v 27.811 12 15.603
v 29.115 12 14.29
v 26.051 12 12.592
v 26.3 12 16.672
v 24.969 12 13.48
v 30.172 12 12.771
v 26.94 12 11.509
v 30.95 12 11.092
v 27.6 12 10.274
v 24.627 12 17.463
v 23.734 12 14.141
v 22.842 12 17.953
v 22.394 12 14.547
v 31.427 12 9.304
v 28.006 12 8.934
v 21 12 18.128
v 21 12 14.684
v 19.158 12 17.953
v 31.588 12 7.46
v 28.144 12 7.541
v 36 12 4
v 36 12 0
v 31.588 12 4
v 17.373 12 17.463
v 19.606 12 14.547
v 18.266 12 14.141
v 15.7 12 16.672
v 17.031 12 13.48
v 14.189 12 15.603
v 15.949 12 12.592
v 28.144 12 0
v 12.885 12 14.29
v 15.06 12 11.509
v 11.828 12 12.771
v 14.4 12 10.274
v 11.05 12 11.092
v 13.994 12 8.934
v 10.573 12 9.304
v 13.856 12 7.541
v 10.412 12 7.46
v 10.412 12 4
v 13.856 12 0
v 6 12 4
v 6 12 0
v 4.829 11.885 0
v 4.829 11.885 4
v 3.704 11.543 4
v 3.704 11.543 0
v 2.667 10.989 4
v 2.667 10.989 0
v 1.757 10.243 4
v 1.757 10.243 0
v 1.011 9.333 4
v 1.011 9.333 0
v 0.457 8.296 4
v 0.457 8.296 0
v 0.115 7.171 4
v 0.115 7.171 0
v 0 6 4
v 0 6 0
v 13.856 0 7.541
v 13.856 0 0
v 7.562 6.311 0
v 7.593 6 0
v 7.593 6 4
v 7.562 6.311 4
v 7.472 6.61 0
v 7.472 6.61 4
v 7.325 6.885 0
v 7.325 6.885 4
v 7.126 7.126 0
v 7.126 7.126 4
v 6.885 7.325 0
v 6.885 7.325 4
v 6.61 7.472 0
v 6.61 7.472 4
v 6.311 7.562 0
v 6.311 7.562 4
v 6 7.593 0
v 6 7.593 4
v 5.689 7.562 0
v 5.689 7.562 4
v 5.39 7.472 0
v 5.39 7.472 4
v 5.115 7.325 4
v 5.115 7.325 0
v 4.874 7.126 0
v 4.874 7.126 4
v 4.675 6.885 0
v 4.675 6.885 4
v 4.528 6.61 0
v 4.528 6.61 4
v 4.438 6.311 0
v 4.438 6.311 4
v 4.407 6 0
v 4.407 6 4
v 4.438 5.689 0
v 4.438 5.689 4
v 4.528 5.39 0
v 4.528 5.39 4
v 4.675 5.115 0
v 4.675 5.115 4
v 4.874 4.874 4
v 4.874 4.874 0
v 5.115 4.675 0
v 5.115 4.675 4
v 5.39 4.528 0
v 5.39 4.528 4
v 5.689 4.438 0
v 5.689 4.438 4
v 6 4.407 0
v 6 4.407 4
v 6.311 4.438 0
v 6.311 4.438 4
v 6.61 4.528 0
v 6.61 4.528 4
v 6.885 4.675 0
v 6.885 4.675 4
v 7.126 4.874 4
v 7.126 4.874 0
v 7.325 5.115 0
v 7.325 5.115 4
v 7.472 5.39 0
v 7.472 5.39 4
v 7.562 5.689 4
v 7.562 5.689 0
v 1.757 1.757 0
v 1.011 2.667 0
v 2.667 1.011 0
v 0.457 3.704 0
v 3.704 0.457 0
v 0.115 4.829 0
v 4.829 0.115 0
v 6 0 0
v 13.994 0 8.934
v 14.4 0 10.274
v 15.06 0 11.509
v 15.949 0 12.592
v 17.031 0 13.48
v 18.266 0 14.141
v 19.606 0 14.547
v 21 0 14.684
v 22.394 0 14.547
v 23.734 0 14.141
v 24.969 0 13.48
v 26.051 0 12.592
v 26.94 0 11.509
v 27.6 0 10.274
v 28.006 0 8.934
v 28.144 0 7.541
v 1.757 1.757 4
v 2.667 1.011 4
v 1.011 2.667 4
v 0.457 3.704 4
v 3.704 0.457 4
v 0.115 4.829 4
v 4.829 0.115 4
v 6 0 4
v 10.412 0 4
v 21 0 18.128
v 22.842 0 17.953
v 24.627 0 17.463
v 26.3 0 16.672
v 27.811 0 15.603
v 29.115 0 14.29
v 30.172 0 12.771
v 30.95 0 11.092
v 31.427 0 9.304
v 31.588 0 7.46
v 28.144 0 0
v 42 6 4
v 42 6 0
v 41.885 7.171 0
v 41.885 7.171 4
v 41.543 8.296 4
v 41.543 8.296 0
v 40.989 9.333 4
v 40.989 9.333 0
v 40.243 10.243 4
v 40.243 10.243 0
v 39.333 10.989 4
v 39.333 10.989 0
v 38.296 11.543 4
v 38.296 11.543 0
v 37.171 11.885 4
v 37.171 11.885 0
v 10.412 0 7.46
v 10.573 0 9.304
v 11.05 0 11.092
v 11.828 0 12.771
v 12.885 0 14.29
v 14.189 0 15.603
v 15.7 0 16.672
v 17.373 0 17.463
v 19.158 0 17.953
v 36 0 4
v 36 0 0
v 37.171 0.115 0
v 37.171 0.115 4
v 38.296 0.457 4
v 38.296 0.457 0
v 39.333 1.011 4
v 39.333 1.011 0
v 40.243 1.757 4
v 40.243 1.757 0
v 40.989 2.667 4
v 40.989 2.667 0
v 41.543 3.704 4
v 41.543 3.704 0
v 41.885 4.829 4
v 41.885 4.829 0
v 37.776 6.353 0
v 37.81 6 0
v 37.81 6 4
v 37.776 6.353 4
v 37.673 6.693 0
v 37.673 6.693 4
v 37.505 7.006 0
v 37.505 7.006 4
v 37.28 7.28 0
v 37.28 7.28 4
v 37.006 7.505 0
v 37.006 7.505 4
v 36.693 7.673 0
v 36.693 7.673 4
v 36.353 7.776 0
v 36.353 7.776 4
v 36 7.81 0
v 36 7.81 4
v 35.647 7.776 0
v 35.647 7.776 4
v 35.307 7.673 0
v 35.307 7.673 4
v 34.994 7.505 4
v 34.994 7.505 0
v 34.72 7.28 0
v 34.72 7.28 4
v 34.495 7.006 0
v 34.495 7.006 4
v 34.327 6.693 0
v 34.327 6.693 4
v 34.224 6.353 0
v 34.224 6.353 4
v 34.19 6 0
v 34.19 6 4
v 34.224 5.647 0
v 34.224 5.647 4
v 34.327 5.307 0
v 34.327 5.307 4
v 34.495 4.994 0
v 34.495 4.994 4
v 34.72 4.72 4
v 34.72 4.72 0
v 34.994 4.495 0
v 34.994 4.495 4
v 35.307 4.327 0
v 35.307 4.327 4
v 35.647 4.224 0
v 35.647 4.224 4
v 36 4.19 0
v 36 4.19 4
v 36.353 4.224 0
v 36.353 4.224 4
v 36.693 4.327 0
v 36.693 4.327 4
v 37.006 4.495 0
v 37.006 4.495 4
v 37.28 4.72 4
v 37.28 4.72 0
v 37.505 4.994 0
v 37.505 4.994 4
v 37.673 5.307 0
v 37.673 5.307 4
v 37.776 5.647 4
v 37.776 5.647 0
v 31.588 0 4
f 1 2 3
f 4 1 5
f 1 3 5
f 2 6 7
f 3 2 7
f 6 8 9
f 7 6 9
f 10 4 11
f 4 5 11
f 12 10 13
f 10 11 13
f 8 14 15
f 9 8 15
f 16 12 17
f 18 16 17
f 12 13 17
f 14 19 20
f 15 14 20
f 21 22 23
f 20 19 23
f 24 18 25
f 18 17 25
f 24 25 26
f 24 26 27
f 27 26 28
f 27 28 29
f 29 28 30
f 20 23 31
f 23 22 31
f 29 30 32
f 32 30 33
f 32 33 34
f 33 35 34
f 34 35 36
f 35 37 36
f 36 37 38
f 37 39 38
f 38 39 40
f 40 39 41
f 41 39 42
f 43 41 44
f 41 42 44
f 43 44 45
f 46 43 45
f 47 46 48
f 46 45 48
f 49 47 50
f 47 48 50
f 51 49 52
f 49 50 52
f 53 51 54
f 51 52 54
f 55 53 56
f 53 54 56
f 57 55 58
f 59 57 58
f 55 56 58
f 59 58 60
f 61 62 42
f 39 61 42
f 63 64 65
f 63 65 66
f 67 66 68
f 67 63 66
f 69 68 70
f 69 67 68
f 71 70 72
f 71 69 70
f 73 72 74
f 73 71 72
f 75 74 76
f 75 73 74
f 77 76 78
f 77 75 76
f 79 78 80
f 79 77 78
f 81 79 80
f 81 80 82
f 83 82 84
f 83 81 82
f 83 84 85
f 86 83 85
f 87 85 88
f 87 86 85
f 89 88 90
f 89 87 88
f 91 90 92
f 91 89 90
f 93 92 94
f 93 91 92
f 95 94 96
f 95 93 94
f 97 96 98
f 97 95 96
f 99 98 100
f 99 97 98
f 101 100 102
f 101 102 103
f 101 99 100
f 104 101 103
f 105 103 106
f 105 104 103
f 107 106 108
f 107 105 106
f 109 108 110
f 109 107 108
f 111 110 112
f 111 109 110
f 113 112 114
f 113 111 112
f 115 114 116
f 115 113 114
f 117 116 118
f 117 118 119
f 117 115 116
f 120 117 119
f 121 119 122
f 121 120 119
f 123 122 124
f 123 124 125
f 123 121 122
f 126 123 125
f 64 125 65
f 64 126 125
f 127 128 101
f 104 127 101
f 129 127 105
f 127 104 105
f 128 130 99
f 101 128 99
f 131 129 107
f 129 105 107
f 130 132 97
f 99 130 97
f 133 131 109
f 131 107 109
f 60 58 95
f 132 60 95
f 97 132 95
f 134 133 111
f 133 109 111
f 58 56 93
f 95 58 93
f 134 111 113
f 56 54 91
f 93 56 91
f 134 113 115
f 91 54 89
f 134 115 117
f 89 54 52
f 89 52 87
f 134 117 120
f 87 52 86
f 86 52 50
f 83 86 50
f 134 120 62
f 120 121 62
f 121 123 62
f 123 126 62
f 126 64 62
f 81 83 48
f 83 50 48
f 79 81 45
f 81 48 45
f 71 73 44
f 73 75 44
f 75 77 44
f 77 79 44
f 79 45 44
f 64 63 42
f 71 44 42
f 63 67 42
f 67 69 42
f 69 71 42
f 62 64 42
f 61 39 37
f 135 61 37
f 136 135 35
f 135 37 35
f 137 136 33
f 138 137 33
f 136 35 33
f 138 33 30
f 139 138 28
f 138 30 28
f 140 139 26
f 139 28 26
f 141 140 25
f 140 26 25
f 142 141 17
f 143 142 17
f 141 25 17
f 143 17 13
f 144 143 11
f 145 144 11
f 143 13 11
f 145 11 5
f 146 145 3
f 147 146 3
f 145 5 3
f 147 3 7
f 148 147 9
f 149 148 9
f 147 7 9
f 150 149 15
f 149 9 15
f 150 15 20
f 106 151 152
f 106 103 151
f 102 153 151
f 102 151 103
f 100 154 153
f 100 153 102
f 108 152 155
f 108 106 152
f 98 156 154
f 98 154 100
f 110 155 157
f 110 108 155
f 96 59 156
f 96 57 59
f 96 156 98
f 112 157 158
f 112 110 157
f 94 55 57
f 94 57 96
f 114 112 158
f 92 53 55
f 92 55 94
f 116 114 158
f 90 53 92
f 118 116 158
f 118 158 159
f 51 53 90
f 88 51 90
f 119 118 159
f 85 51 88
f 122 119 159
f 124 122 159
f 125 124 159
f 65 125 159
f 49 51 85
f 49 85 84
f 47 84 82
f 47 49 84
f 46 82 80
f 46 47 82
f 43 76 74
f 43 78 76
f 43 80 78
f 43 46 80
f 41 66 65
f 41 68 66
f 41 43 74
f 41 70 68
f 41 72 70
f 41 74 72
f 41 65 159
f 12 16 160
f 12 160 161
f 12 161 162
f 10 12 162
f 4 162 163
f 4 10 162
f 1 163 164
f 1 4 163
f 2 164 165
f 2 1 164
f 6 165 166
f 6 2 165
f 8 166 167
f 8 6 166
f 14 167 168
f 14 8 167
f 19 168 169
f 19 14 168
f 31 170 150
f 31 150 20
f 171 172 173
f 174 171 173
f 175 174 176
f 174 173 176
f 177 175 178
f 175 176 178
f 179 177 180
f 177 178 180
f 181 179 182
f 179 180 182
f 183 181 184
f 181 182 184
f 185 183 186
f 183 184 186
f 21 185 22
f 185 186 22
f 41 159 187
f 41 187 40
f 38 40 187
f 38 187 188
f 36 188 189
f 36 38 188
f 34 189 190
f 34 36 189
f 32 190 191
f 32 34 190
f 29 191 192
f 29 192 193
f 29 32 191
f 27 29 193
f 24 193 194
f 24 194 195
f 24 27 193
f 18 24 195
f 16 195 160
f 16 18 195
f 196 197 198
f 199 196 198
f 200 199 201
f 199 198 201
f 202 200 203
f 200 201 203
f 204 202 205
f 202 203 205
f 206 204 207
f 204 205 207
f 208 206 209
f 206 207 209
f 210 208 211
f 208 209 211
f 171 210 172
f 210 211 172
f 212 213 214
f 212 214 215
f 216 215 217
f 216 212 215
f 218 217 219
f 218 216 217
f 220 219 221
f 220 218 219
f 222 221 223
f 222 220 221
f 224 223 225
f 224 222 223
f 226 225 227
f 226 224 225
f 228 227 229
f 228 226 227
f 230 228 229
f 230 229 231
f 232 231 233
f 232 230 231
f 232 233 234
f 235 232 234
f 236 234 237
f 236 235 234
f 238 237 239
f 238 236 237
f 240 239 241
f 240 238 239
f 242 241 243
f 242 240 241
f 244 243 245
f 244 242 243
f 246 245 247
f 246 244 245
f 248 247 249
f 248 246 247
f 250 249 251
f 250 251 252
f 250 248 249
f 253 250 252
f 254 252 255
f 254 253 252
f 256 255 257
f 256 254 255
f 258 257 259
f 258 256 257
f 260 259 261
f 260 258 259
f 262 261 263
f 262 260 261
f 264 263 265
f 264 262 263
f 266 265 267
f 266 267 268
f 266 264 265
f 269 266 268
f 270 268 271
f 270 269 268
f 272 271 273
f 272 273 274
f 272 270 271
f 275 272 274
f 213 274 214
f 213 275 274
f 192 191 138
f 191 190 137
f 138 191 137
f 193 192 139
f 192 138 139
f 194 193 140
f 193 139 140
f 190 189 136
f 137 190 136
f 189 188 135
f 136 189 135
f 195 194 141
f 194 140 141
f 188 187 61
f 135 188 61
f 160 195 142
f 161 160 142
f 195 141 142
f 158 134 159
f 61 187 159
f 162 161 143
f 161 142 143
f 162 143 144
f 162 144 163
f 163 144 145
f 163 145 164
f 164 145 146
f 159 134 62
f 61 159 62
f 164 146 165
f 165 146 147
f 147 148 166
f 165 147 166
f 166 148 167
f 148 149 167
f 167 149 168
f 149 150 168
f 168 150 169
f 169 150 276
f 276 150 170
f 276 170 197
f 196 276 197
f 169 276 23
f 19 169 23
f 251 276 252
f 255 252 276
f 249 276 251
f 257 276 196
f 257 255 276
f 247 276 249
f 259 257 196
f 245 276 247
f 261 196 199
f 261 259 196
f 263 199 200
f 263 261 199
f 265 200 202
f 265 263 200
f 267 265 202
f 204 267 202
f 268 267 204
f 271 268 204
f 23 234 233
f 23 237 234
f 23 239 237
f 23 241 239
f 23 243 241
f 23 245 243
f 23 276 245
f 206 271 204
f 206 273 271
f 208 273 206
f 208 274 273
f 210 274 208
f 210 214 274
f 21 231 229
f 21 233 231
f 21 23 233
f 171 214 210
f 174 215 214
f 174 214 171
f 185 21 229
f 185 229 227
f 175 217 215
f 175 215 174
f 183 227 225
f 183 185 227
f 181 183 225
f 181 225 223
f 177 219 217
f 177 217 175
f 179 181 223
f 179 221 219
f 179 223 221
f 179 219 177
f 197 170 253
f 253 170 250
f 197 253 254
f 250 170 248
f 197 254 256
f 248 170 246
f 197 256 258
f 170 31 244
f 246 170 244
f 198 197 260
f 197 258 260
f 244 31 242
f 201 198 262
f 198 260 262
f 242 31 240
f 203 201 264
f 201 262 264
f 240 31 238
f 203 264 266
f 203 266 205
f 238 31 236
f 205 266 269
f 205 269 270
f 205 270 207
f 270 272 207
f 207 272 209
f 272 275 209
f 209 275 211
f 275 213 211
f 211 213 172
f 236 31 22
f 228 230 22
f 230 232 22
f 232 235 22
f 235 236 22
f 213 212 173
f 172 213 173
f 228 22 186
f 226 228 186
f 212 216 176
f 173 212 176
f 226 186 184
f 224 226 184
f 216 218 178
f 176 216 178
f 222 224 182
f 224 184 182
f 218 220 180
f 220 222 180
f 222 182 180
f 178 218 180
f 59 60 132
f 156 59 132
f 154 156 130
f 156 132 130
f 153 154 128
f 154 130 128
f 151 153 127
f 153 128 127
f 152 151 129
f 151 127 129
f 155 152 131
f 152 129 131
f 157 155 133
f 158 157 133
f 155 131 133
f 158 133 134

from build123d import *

# Parameters (mm, degrees)
F0_R        = 1.5930303601
F1_DEPTH    = 4
F0_R_2      = 1.8103813353
F0_W        = 18
F0_H        = 12
F0_W_2      = 1.5875
F2_DEPTH    = 18.1281324
F3_R        = 7.14375
F4_DEPTH    = 25.4
F5_W        = 14.2875
F5_H        = 12.0000014
F6_DEPTH    = 7.540625
F7_T1_DEPTH = 65.34


# Not quite as in the source:
# - a fillet or chamfer that OpenCascade refuses, or shapes differently, is made with other operations: its cross-section is extruded or revolved along the edge and cut away or added


with BuildPart() as f1:
    # F0 (on Top) → F1 (new body)
    with BuildSketch(Plane.XY):
        with BuildLine():
            ThreePointArc((0, 6), (1.7573593129, 1.7573593129), (6, 0))
            Line((6, 0), (10.4125, 0))
            Line((10.4125, 0), (10.4125, 12))
            Line((10.4125, 12), (6, 12))
            ThreePointArc((6, 12), (1.7573593129, 10.2426406871), (0, 6))
        make_face()
        with Locations((6, 6)):
            Circle(F0_R, mode=Mode.SUBTRACT)
    extrude(amount=F1_DEPTH)



with BuildPart() as f1b:
    # F0 (on Top) → F1, piece 2 (new body)
    with BuildSketch(Plane.XY):
        with BuildLine():
            Line((31.5875, 12), (31.5875, 0))
            Line((31.5875, 0), (36, 0))
            ThreePointArc((36, 0), (40.2426406871, 1.7573593129), (42, 6))
            ThreePointArc((42, 6), (40.2426406871, 10.2426406871), (36, 12))
            Line((36, 12), (31.5875, 12))
        make_face()
        with Locations((36, 6)):
            Circle(F0_R_2, mode=Mode.SUBTRACT)
    extrude(amount=F1_DEPTH)


with BuildPart() as f1_1:
    add(f1.part)

    add(f1b.part)  # F2 merges F1b
    # F0 (on Top) → F2 (join)
    with BuildSketch(Plane.XY):
        with Locations((21, 6)):
            Rectangle(F0_W, F0_H)
        with Locations((11.20625, 6)):
            Rectangle(F0_W_2, F0_H)
        with Locations((30.79375, 6)):
            Rectangle(F0_W_2, F0_H)
    extrude(amount=F2_DEPTH)

    # F3 (on face) → F4 (cut)
    with BuildSketch(Plane(origin=(0, 12, 0), x_dir=(-1, 0, 0), z_dir=(0, 1, 0))):
        with Locations((-20.9999947, 7.540625)):
            Circle(F3_R)
    extrude(amount=-F4_DEPTH, mode=Mode.SUBTRACT)

    # F5 (on face) → F6 (cut)
    with BuildSketch(Plane.XY):
        with Locations((20.9999947, 6.0000007)):
            Rectangle(F5_W, F5_H)
    extrude(amount=F6_DEPTH, mode=Mode.SUBTRACT)

    # F7: fillet of radius 10.668 on 2 edges, made by hand

    # F7_s2 → F7_t1 (cut)
    with BuildSketch(Plane.XZ.offset(-38.67)):
        with BuildLine():
            ThreePointArc((10.4125, 7.4601324), (13.5370848583, 15.0035475417), (21.0805, 18.1281324))
            Line((21.0805, 18.1281324), (10.4125, 18.1281324))
            Line((10.4125, 18.1281324), (10.4125, 7.4601324))
        make_face()
        with BuildLine():
            ThreePointArc((20.9195, 18.1281324), (28.4629151417, 15.0035475417), (31.5875, 7.4601324))
            Line((31.5875, 7.4601324), (31.5875, 18.1281324))
            Line((31.5875, 18.1281324), (20.9195, 18.1281324))
        make_face()
    extrude(amount=F7_T1_DEPTH, mode=Mode.SUBTRACT)


solid = f1_1.part
